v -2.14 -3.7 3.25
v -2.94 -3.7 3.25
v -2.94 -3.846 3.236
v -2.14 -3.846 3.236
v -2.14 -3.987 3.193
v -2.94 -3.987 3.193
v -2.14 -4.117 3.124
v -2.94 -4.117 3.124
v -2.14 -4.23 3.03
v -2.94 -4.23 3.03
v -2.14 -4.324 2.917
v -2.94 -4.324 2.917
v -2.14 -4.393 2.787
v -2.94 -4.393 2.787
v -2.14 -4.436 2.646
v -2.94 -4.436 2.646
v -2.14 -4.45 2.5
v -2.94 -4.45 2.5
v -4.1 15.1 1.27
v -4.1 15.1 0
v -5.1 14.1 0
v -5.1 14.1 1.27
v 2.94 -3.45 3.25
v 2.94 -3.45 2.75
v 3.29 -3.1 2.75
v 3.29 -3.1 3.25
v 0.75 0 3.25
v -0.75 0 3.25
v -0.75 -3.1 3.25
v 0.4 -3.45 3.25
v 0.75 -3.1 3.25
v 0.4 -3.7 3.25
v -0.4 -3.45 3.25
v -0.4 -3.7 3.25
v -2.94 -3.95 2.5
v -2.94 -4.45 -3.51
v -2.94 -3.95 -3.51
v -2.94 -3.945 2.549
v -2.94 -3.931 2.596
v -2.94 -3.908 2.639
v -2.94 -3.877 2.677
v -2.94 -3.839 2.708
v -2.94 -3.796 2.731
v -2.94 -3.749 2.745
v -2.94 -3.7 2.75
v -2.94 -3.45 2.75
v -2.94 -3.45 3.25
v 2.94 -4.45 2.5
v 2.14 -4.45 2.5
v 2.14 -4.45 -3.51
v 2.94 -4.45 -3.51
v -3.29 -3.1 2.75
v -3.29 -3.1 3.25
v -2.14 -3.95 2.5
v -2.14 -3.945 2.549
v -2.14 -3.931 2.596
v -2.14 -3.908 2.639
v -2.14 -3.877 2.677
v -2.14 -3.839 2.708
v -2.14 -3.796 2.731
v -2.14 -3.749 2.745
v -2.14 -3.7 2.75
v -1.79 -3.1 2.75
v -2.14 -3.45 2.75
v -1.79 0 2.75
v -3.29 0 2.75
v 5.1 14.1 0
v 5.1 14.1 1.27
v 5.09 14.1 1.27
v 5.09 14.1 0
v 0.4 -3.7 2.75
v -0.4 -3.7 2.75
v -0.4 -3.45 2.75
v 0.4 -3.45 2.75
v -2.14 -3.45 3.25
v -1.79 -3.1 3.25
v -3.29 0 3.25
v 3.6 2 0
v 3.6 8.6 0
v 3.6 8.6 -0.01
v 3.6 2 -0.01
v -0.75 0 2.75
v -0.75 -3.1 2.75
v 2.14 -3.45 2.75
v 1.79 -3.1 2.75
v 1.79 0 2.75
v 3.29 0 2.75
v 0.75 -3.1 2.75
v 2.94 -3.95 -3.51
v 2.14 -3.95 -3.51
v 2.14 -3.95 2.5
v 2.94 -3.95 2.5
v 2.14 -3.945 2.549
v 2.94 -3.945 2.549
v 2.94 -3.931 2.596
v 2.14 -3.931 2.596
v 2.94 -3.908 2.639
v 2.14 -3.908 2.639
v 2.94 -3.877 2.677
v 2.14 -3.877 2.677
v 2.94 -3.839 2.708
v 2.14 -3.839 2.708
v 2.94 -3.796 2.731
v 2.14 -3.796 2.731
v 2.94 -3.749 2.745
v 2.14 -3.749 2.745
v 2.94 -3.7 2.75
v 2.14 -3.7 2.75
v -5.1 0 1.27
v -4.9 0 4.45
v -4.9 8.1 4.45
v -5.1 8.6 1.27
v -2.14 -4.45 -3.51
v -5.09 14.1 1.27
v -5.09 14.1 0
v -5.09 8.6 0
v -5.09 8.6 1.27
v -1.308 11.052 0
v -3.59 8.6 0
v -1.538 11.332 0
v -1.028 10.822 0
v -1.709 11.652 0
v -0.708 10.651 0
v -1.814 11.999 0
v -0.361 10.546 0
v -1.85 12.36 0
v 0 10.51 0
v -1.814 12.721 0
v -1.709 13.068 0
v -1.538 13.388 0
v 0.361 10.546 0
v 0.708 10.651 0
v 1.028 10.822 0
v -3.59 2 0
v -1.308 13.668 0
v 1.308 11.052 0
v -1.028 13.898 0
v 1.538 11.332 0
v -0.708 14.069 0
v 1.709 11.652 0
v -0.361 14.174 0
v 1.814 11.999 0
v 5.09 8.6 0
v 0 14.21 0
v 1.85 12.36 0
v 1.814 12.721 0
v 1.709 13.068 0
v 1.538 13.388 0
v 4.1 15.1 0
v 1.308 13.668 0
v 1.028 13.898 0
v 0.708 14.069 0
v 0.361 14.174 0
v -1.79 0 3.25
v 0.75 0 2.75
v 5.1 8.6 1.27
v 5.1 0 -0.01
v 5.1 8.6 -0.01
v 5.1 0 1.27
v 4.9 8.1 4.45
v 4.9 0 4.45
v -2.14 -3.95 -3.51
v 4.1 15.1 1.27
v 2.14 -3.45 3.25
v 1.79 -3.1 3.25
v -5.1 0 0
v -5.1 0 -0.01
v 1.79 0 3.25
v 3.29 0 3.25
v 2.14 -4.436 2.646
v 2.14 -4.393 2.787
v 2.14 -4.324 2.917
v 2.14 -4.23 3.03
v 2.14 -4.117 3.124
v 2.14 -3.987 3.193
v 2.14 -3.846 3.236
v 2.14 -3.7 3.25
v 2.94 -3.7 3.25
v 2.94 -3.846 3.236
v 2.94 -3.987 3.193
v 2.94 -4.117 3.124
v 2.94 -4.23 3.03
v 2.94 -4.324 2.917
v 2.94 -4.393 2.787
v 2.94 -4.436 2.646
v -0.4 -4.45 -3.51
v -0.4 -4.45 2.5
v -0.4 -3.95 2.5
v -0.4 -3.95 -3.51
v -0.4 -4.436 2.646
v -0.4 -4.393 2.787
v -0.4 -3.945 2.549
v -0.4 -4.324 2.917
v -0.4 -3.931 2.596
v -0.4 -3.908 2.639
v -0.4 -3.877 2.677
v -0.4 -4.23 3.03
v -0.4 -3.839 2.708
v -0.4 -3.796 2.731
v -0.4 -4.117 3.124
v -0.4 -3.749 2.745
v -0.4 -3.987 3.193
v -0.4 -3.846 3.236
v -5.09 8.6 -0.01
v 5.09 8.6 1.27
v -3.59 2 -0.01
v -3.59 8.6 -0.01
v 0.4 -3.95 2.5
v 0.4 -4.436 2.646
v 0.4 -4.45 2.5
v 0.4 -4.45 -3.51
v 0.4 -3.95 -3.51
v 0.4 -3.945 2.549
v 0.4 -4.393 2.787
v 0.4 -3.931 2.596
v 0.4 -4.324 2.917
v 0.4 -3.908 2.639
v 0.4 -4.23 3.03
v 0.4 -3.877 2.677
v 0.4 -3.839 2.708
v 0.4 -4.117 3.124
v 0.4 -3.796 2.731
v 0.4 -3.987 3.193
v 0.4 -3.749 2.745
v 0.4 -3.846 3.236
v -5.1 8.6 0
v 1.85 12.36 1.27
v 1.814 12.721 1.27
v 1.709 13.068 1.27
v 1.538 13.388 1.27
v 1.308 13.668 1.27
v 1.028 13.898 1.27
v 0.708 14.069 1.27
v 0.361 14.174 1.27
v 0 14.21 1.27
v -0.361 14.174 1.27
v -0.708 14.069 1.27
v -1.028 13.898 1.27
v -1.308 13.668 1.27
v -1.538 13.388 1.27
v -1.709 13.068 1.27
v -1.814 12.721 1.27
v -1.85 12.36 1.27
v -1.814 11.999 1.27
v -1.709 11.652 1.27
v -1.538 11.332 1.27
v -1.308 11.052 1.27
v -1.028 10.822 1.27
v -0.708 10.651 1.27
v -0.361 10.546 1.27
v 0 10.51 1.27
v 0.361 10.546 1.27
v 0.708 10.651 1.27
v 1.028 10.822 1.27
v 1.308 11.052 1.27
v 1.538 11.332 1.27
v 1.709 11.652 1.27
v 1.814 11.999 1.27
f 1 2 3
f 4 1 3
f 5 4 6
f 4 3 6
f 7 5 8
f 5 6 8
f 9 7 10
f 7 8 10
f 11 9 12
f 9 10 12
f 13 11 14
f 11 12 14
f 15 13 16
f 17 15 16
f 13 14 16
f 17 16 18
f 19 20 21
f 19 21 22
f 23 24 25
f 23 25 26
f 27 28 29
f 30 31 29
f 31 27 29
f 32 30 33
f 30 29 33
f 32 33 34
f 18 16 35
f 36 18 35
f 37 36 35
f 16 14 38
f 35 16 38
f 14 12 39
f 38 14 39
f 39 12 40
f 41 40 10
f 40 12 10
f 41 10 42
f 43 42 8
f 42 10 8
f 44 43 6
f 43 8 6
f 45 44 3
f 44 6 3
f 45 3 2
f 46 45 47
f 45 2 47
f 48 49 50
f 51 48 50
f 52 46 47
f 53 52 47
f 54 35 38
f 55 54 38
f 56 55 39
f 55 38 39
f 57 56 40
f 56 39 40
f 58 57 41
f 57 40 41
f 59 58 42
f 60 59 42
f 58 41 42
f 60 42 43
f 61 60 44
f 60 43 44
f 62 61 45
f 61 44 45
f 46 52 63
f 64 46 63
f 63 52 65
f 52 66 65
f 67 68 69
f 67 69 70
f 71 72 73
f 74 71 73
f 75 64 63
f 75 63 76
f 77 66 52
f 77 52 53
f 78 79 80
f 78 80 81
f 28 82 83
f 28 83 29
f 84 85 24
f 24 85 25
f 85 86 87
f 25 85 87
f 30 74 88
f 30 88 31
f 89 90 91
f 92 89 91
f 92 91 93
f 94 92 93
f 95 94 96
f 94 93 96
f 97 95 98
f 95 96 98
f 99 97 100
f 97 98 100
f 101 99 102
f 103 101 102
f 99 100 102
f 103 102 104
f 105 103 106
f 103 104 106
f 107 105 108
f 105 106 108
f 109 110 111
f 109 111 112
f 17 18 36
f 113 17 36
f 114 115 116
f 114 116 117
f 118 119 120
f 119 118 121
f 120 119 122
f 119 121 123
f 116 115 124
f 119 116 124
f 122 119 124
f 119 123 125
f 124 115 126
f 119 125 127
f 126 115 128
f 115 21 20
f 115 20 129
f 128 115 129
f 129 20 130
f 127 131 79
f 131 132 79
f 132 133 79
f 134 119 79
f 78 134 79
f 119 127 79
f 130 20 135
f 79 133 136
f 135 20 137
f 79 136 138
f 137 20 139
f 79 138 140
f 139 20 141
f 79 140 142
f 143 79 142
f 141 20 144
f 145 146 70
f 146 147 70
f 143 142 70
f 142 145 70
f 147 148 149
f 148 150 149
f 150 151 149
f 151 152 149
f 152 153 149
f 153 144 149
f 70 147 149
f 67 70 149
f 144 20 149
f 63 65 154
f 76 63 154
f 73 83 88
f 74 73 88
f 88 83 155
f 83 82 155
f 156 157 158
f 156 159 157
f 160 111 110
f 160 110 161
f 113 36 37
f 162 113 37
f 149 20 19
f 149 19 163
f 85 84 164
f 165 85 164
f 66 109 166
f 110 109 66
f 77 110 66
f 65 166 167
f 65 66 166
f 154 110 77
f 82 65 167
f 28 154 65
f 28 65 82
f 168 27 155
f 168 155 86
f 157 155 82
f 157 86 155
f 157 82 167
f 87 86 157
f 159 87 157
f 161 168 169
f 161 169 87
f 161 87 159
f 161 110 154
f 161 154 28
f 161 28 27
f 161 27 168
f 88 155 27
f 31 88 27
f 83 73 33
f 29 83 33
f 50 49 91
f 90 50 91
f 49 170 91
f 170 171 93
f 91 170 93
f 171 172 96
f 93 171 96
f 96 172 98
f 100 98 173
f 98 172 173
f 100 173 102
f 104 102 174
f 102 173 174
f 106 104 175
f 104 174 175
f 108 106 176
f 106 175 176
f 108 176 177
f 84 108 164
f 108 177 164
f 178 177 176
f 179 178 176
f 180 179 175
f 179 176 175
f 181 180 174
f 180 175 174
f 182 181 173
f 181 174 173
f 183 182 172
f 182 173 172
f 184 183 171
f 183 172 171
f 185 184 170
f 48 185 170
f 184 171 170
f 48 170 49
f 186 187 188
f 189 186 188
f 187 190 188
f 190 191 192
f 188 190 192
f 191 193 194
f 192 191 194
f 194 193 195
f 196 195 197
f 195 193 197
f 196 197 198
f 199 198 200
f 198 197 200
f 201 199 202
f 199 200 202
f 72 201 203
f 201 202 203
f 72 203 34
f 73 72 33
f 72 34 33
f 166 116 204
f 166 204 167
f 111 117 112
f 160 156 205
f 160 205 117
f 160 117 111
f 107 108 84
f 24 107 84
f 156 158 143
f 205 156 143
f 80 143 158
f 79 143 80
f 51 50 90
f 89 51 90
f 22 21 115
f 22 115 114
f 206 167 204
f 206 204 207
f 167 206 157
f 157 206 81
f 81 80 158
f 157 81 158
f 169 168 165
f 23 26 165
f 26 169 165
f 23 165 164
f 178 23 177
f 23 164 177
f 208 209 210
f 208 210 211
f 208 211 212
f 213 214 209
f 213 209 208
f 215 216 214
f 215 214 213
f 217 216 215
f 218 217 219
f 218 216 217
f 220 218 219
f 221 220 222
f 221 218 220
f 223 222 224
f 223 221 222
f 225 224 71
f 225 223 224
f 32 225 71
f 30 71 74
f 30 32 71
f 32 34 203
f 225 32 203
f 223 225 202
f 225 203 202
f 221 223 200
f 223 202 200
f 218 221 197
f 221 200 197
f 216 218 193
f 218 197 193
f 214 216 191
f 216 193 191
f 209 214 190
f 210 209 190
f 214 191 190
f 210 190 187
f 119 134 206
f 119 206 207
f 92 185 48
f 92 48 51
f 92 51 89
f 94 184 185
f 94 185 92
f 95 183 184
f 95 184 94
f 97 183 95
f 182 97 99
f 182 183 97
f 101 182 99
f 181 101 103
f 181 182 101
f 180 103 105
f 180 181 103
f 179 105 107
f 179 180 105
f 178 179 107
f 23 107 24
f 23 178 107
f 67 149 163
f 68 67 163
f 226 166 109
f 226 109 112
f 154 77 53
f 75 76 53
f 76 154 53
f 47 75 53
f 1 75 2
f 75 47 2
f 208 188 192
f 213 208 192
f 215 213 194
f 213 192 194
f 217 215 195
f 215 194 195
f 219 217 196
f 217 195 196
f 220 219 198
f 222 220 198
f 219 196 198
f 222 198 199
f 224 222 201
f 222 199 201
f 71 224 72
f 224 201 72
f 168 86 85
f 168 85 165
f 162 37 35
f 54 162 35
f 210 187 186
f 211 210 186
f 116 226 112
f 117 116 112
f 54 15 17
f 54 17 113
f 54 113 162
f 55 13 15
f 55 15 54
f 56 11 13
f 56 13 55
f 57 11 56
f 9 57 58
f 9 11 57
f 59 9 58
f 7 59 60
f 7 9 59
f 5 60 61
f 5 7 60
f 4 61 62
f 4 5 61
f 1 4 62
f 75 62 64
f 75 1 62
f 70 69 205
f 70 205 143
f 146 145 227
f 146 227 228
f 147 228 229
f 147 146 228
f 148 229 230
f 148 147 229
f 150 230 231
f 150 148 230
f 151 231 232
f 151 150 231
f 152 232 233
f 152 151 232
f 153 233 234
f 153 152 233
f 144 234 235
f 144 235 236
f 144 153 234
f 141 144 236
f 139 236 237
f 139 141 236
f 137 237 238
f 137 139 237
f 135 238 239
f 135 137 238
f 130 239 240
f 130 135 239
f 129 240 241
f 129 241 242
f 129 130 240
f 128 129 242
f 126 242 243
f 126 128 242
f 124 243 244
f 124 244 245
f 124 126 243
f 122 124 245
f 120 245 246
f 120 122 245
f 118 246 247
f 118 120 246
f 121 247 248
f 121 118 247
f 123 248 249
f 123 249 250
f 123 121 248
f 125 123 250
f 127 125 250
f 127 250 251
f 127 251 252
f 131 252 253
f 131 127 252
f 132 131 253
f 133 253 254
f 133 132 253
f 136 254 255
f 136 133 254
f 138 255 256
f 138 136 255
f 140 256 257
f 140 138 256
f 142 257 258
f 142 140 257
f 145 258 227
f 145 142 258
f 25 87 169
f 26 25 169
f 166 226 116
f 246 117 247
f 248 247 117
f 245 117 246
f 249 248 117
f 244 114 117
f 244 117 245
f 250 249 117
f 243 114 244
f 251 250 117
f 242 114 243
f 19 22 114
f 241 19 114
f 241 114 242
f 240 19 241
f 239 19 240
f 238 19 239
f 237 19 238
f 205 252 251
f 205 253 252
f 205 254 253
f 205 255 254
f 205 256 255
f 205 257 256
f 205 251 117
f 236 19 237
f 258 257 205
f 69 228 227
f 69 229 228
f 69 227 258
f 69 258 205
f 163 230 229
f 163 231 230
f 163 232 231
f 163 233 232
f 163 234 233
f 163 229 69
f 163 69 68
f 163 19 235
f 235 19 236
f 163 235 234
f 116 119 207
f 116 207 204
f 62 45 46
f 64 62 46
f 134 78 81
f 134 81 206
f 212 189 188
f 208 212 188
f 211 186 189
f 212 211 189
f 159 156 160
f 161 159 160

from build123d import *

# Parameters (mm, degrees)
ESQUISSE1_W              = 10.2
ESQUISSE1_H              = 15.1
ESQUISSE1_R              = 1.85
BOSS_EXTRU_1_DEPTH       = 1.27
ESQUISSE2_W              = 10.2
ESQUISSE2_H              = 8.6
BOSS_EXTRU_2_DEPTH       = 3.18
ENL_V_MAT_EXTRU_1_DEPTH  = 11.944062317
ENL_V_MAT_EXTRU_2_DEPTH  = 19.757731739
ESQUISSE5_W              = 1.5
ESQUISSE5_H              = 0.5
BOSS_EXTRU_3_DEPTH       = 3.1
ESQUISSE6_W              = 0.8
ESQUISSE6_H              = 0.5
BOSS_EXTRU_4_DEPTH       = 3.5
CHANFREIN1_SIZE          = 0.35
CHANFREIN2_SIZE          = 1
ESQUISSE8_W              = 1.27
ESQUISSE8_H              = 5.5
ENL_V_MAT_EXTRU_4_DEPTH  = 0.01
ESQUISSE9_W              = 1.27
ESQUISSE9_H              = 5.5
ENL_V_MAT_EXTRU_5_DEPTH  = 0.01
BOSS_EXTRU_6_DEPTH       = 0.01
ESQUISSE12_W             = 5.88
ESQUISSE12_H             = 3.15
ENL_V_MAT_EXTRU_15_DEPTH = 17.267993115
BALAYAGE1_START          = -2.94
BALAYAGE1_DEPTH          = 0.8
BALAYAGE2_START          = 2.14
BALAYAGE2_DEPTH          = 0.8
BALAYAGE3_START          = -0.4
BALAYAGE3_DEPTH          = 0.8


# Read off the part's stored shape, not the designer's step: Balayage1, Balayage2, Balayage3
with BuildPart() as part:
    # Esquisse1 → Boss.-Extru.1 (new body)
    with BuildSketch(Plane.XY):
        with Locations((0, 7.55)):
            Rectangle(ESQUISSE1_W, ESQUISSE1_H)
        with Locations((0, 12.36)):
            Circle(ESQUISSE1_R, mode=Mode.SUBTRACT)
    extrude(amount=BOSS_EXTRU_1_DEPTH)

    # Esquisse2 → Boss.-Extru.2 (add)
    with BuildSketch(Plane.XY.offset(1.27)):
        with Locations((0, 4.3)):
            Rectangle(ESQUISSE2_W, ESQUISSE2_H)
    extrude(amount=BOSS_EXTRU_2_DEPTH)

    # Esquisse3 → Enlèv. mat.-Extru.1 (cut, through all)
    with BuildSketch(Plane(origin=(0, 8.6, 0), x_dir=(1, 0, 0), z_dir=(0, 1, 0))):
        Polygon((5.1, -1.27), (4.9, -4.45), (5.1, -4.45), align=None)
        Polygon((-5.1, -1.27), (-5.1, -4.45), (-4.9, -4.45), align=None)
    extrude(amount=-ENL_V_MAT_EXTRU_1_DEPTH, mode=Mode.SUBTRACT)

    # Esquisse4 → Enlèv. mat.-Extru.2 (cut, through all)
    with BuildSketch(Plane(origin=(5.1, 0, 0), x_dir=(0, 0, -1), z_dir=(1, 0, 0))):
        Polygon((-1.27, 8.6), (-4.45, 8.1), (-4.45, 8.6), align=None)
    extrude(amount=-ENL_V_MAT_EXTRU_2_DEPTH, mode=Mode.SUBTRACT)

    # Esquisse5 → Boss.-Extru.3 (add)
    with BuildSketch(Plane.XZ):
        with Locations((0, 3)):
            Rectangle(ESQUISSE5_W, ESQUISSE5_H)
        with Locations((2.54, 3)):
            Rectangle(ESQUISSE5_W, ESQUISSE5_H)
        with Locations((-2.54, 3)):
            Rectangle(ESQUISSE5_W, ESQUISSE5_H)
    extrude(amount=BOSS_EXTRU_3_DEPTH)

    # Esquisse6 → Boss.-Extru.4 (add)
    with BuildSketch(Plane.XZ.offset(3.1)):
        with Locations((-2.54, 3)):
            Rectangle(ESQUISSE6_W, ESQUISSE6_H)
        with Locations((0, 3)):
            Rectangle(ESQUISSE6_W, ESQUISSE6_H)
        with Locations((2.54, 3)):
            Rectangle(ESQUISSE6_W, ESQUISSE6_H)
    extrude(amount=BOSS_EXTRU_4_DEPTH)

    # Chanfrein1
    chanfrein1_edges = [part.edges().sort_by_distance(p)[0] for p in [
        (2.94, -3.1, 3),
        (0.4, -3.1, 3),
        (-2.14, -3.1, 3),
        (2.14, -3.1, 3),
        (-0.4, -3.1, 3),
        (-2.94, -3.1, 3),
    ]]
    chamfer(chanfrein1_edges, length=CHANFREIN1_SIZE - 0.0001)  # a hair under: the kernel refuses the full size

    # Chanfrein2
    chanfrein2_edges = [part.edges().sort_by_distance(p)[0] for p in [
        (-5.1, 15.1, 0.635),
        (5.1, 15.1, 0.635),
    ]]
    chamfer(chanfrein2_edges, length=CHANFREIN2_SIZE)

    # Esquisse8 → Enlèv. mat.-Extru.4 (cut)
    with BuildSketch(Plane(origin=(5.1, 0, 0), x_dir=(0, 0, -1), z_dir=(1, 0, 0))):
        with Locations((-0.635, 11.35)):
            Rectangle(ESQUISSE8_W, ESQUISSE8_H)
    extrude(amount=-ENL_V_MAT_EXTRU_4_DEPTH, mode=Mode.SUBTRACT)

    # Esquisse9 → Enlèv. mat.-Extru.5 (cut)
    with BuildSketch(Plane.ZY.offset(5.1)):
        with Locations((0.635, 11.35)):
            Rectangle(ESQUISSE9_W, ESQUISSE9_H)
    extrude(amount=-ENL_V_MAT_EXTRU_5_DEPTH, mode=Mode.SUBTRACT)

    # Esquisse11 → Boss.-Extru.6 (add)
    with BuildSketch(Plane(origin=(0, 0, 0), x_dir=(-1, 0, 0), z_dir=(0, 0, -1))):
        Polygon((-5.1, 0), (-5.1, 8.6), (-3.6, 8.6), (-3.6, 2), (3.59, 2), (3.59, 8.6), (5.09, 8.6), (5.1, 0), align=None)
    extrude(amount=BOSS_EXTRU_6_DEPTH)

    # Esquisse12 → Enlèv. mat.-Extru.15 (cut, through all)
    with BuildSketch(Plane.XY.offset(3.25)):
        with Locations((0, -5.025)):
            Rectangle(ESQUISSE12_W, ESQUISSE12_H)
    extrude(amount=-ENL_V_MAT_EXTRU_15_DEPTH, mode=Mode.SUBTRACT)

    # Balayage1 outline → Balayage1 (add)
    with BuildSketch(Plane.YZ.offset(BALAYAGE1_START)):
        with BuildLine():
            Line((-4.45, 2.5), (-4.45, -3.51))
            Line((-4.45, -3.51), (-3.95, -3.51))
            Line((-3.95, -3.51), (-3.95, 2.5))
            ThreePointArc((-3.95, 2.5), (-3.876776695, 2.676776695), (-3.7, 2.75))
            Line((-3.7, 2.75), (-3.45, 2.750000001))
            Line((-3.45, 2.750000001), (-3.45, 3.25))
            Line((-3.45, 3.25), (-3.7, 3.25))
            ThreePointArc((-3.7, 3.25), (-4.230330086, 3.030330086), (-4.45, 2.5))
        make_face()
    extrude(amount=BALAYAGE1_DEPTH)

    # Balayage2 outline → Balayage2 (add)
    with BuildSketch(Plane.YZ.offset(BALAYAGE2_START)):
        with BuildLine():
            Line((-4.45, 2.5), (-4.45, -3.51))
            Line((-4.45, -3.51), (-3.95, -3.51))
            Line((-3.95, -3.51), (-3.95, 2.5))
            ThreePointArc((-3.95, 2.5), (-3.876776695, 2.676776695), (-3.7, 2.75))
            Line((-3.7, 2.75), (-3.45, 2.750000001))
            Line((-3.45, 2.750000001), (-3.45, 3.25))
            Line((-3.45, 3.25), (-3.7, 3.25))
            ThreePointArc((-3.7, 3.25), (-4.230330086, 3.030330086), (-4.45, 2.5))
        make_face()
    extrude(amount=BALAYAGE2_DEPTH)

    # Balayage3 outline → Balayage3 (add)
    with BuildSketch(Plane.YZ.offset(BALAYAGE3_START)):
        with BuildLine():
            Line((-4.45, 2.5), (-4.45, -3.51))
            Line((-4.45, -3.51), (-3.95, -3.51))
            Line((-3.95, -3.51), (-3.95, 2.5))
            ThreePointArc((-3.95, 2.5), (-3.876776695, 2.676776695), (-3.7, 2.75))
            Line((-3.7, 2.75), (-3.45, 2.750000001))
            Line((-3.45, 2.750000001), (-3.45, 3.25))
            Line((-3.45, 3.25), (-3.7, 3.25))
            ThreePointArc((-3.7, 3.25), (-4.230330086, 3.030330086), (-4.45, 2.5))
        make_face()
    extrude(amount=BALAYAGE3_DEPTH)


solid = part.part
